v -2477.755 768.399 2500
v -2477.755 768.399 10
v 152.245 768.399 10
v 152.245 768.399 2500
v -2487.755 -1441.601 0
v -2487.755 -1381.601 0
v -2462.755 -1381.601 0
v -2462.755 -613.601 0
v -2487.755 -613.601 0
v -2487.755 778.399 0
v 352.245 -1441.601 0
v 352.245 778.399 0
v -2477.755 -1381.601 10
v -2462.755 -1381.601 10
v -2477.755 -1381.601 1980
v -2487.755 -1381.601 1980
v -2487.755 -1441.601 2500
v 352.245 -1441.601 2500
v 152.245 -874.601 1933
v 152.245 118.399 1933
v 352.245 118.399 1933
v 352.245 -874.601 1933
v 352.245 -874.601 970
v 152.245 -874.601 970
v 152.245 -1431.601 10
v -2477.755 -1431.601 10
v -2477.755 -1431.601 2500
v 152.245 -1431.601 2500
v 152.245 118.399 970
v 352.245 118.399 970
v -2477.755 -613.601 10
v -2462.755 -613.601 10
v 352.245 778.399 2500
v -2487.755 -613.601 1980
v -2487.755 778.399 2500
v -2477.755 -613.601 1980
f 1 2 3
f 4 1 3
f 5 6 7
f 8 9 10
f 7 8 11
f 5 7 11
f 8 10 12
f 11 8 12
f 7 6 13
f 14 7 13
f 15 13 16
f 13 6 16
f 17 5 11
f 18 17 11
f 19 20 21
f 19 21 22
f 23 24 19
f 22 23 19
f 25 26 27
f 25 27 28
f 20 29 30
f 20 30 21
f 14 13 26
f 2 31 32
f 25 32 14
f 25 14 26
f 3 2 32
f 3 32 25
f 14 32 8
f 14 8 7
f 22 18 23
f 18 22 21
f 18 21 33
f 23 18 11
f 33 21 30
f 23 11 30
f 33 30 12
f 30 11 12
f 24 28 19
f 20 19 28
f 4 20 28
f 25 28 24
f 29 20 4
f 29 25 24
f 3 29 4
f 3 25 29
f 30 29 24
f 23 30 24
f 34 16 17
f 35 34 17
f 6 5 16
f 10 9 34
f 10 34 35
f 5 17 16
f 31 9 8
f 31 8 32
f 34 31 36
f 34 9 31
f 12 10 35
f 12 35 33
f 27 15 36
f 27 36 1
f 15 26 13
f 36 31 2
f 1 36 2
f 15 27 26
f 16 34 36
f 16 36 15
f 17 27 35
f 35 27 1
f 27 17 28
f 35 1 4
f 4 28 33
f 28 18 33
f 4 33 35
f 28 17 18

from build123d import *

# Parameters (mm, degrees)
F0_W     = 2840
F0_H     = 2220
F1_DEPTH = 2500
F2_T     = -10
F3_DEPTH = 190
F4_W     = 768
F4_H     = 1980
F5_DEPTH = 25
F6_W     = 993
F6_H     = 963
F7_DEPTH = 220


with BuildPart() as f1:
    # F0 (on Top) → F1 (new body)
    with BuildSketch(Plane.XY):
        with Locations((-1067.755253911, -331.6014169445)):
            Rectangle(F0_W, F0_H)
    extrude(amount=F1_DEPTH)

    # F2
    f2_openings = [f1.faces().sort_by_distance(p)[0] for p in [
        (-1067.755254, -331.601417, 2500),
    ]]
    offset(amount=F2_T, openings=f2_openings)

    # F3 (add): a face of the model
    f3_faces = [f1.faces().sort_by_distance(p)[0] for p in [
        (342.244746089, -331.6014169445, 1255),
    ]]
    extrude(f3_faces, amount=F3_DEPTH)

    # F4 (on face) → F5 (cut)
    with BuildSketch(Plane(origin=(-2487.755253911, 0, 0), x_dir=(0, -1, 0), z_dir=(-1, 0, 0))):
        with Locations((997.6014169445, 990)):
            Rectangle(F4_W, F4_H)
    extrude(amount=-F5_DEPTH, mode=Mode.SUBTRACT)

    # F6 (on face) → F7 (cut)
    with BuildSketch(Plane(origin=(152.244746089, 0, 0), x_dir=(0, -1, 0), z_dir=(-1, 0, 0))):
        with Locations((378.1014169445, 1451.5)):
            Rectangle(F6_W, F6_H)
    extrude(amount=-F7_DEPTH, mode=Mode.SUBTRACT)


solid = f1.part
